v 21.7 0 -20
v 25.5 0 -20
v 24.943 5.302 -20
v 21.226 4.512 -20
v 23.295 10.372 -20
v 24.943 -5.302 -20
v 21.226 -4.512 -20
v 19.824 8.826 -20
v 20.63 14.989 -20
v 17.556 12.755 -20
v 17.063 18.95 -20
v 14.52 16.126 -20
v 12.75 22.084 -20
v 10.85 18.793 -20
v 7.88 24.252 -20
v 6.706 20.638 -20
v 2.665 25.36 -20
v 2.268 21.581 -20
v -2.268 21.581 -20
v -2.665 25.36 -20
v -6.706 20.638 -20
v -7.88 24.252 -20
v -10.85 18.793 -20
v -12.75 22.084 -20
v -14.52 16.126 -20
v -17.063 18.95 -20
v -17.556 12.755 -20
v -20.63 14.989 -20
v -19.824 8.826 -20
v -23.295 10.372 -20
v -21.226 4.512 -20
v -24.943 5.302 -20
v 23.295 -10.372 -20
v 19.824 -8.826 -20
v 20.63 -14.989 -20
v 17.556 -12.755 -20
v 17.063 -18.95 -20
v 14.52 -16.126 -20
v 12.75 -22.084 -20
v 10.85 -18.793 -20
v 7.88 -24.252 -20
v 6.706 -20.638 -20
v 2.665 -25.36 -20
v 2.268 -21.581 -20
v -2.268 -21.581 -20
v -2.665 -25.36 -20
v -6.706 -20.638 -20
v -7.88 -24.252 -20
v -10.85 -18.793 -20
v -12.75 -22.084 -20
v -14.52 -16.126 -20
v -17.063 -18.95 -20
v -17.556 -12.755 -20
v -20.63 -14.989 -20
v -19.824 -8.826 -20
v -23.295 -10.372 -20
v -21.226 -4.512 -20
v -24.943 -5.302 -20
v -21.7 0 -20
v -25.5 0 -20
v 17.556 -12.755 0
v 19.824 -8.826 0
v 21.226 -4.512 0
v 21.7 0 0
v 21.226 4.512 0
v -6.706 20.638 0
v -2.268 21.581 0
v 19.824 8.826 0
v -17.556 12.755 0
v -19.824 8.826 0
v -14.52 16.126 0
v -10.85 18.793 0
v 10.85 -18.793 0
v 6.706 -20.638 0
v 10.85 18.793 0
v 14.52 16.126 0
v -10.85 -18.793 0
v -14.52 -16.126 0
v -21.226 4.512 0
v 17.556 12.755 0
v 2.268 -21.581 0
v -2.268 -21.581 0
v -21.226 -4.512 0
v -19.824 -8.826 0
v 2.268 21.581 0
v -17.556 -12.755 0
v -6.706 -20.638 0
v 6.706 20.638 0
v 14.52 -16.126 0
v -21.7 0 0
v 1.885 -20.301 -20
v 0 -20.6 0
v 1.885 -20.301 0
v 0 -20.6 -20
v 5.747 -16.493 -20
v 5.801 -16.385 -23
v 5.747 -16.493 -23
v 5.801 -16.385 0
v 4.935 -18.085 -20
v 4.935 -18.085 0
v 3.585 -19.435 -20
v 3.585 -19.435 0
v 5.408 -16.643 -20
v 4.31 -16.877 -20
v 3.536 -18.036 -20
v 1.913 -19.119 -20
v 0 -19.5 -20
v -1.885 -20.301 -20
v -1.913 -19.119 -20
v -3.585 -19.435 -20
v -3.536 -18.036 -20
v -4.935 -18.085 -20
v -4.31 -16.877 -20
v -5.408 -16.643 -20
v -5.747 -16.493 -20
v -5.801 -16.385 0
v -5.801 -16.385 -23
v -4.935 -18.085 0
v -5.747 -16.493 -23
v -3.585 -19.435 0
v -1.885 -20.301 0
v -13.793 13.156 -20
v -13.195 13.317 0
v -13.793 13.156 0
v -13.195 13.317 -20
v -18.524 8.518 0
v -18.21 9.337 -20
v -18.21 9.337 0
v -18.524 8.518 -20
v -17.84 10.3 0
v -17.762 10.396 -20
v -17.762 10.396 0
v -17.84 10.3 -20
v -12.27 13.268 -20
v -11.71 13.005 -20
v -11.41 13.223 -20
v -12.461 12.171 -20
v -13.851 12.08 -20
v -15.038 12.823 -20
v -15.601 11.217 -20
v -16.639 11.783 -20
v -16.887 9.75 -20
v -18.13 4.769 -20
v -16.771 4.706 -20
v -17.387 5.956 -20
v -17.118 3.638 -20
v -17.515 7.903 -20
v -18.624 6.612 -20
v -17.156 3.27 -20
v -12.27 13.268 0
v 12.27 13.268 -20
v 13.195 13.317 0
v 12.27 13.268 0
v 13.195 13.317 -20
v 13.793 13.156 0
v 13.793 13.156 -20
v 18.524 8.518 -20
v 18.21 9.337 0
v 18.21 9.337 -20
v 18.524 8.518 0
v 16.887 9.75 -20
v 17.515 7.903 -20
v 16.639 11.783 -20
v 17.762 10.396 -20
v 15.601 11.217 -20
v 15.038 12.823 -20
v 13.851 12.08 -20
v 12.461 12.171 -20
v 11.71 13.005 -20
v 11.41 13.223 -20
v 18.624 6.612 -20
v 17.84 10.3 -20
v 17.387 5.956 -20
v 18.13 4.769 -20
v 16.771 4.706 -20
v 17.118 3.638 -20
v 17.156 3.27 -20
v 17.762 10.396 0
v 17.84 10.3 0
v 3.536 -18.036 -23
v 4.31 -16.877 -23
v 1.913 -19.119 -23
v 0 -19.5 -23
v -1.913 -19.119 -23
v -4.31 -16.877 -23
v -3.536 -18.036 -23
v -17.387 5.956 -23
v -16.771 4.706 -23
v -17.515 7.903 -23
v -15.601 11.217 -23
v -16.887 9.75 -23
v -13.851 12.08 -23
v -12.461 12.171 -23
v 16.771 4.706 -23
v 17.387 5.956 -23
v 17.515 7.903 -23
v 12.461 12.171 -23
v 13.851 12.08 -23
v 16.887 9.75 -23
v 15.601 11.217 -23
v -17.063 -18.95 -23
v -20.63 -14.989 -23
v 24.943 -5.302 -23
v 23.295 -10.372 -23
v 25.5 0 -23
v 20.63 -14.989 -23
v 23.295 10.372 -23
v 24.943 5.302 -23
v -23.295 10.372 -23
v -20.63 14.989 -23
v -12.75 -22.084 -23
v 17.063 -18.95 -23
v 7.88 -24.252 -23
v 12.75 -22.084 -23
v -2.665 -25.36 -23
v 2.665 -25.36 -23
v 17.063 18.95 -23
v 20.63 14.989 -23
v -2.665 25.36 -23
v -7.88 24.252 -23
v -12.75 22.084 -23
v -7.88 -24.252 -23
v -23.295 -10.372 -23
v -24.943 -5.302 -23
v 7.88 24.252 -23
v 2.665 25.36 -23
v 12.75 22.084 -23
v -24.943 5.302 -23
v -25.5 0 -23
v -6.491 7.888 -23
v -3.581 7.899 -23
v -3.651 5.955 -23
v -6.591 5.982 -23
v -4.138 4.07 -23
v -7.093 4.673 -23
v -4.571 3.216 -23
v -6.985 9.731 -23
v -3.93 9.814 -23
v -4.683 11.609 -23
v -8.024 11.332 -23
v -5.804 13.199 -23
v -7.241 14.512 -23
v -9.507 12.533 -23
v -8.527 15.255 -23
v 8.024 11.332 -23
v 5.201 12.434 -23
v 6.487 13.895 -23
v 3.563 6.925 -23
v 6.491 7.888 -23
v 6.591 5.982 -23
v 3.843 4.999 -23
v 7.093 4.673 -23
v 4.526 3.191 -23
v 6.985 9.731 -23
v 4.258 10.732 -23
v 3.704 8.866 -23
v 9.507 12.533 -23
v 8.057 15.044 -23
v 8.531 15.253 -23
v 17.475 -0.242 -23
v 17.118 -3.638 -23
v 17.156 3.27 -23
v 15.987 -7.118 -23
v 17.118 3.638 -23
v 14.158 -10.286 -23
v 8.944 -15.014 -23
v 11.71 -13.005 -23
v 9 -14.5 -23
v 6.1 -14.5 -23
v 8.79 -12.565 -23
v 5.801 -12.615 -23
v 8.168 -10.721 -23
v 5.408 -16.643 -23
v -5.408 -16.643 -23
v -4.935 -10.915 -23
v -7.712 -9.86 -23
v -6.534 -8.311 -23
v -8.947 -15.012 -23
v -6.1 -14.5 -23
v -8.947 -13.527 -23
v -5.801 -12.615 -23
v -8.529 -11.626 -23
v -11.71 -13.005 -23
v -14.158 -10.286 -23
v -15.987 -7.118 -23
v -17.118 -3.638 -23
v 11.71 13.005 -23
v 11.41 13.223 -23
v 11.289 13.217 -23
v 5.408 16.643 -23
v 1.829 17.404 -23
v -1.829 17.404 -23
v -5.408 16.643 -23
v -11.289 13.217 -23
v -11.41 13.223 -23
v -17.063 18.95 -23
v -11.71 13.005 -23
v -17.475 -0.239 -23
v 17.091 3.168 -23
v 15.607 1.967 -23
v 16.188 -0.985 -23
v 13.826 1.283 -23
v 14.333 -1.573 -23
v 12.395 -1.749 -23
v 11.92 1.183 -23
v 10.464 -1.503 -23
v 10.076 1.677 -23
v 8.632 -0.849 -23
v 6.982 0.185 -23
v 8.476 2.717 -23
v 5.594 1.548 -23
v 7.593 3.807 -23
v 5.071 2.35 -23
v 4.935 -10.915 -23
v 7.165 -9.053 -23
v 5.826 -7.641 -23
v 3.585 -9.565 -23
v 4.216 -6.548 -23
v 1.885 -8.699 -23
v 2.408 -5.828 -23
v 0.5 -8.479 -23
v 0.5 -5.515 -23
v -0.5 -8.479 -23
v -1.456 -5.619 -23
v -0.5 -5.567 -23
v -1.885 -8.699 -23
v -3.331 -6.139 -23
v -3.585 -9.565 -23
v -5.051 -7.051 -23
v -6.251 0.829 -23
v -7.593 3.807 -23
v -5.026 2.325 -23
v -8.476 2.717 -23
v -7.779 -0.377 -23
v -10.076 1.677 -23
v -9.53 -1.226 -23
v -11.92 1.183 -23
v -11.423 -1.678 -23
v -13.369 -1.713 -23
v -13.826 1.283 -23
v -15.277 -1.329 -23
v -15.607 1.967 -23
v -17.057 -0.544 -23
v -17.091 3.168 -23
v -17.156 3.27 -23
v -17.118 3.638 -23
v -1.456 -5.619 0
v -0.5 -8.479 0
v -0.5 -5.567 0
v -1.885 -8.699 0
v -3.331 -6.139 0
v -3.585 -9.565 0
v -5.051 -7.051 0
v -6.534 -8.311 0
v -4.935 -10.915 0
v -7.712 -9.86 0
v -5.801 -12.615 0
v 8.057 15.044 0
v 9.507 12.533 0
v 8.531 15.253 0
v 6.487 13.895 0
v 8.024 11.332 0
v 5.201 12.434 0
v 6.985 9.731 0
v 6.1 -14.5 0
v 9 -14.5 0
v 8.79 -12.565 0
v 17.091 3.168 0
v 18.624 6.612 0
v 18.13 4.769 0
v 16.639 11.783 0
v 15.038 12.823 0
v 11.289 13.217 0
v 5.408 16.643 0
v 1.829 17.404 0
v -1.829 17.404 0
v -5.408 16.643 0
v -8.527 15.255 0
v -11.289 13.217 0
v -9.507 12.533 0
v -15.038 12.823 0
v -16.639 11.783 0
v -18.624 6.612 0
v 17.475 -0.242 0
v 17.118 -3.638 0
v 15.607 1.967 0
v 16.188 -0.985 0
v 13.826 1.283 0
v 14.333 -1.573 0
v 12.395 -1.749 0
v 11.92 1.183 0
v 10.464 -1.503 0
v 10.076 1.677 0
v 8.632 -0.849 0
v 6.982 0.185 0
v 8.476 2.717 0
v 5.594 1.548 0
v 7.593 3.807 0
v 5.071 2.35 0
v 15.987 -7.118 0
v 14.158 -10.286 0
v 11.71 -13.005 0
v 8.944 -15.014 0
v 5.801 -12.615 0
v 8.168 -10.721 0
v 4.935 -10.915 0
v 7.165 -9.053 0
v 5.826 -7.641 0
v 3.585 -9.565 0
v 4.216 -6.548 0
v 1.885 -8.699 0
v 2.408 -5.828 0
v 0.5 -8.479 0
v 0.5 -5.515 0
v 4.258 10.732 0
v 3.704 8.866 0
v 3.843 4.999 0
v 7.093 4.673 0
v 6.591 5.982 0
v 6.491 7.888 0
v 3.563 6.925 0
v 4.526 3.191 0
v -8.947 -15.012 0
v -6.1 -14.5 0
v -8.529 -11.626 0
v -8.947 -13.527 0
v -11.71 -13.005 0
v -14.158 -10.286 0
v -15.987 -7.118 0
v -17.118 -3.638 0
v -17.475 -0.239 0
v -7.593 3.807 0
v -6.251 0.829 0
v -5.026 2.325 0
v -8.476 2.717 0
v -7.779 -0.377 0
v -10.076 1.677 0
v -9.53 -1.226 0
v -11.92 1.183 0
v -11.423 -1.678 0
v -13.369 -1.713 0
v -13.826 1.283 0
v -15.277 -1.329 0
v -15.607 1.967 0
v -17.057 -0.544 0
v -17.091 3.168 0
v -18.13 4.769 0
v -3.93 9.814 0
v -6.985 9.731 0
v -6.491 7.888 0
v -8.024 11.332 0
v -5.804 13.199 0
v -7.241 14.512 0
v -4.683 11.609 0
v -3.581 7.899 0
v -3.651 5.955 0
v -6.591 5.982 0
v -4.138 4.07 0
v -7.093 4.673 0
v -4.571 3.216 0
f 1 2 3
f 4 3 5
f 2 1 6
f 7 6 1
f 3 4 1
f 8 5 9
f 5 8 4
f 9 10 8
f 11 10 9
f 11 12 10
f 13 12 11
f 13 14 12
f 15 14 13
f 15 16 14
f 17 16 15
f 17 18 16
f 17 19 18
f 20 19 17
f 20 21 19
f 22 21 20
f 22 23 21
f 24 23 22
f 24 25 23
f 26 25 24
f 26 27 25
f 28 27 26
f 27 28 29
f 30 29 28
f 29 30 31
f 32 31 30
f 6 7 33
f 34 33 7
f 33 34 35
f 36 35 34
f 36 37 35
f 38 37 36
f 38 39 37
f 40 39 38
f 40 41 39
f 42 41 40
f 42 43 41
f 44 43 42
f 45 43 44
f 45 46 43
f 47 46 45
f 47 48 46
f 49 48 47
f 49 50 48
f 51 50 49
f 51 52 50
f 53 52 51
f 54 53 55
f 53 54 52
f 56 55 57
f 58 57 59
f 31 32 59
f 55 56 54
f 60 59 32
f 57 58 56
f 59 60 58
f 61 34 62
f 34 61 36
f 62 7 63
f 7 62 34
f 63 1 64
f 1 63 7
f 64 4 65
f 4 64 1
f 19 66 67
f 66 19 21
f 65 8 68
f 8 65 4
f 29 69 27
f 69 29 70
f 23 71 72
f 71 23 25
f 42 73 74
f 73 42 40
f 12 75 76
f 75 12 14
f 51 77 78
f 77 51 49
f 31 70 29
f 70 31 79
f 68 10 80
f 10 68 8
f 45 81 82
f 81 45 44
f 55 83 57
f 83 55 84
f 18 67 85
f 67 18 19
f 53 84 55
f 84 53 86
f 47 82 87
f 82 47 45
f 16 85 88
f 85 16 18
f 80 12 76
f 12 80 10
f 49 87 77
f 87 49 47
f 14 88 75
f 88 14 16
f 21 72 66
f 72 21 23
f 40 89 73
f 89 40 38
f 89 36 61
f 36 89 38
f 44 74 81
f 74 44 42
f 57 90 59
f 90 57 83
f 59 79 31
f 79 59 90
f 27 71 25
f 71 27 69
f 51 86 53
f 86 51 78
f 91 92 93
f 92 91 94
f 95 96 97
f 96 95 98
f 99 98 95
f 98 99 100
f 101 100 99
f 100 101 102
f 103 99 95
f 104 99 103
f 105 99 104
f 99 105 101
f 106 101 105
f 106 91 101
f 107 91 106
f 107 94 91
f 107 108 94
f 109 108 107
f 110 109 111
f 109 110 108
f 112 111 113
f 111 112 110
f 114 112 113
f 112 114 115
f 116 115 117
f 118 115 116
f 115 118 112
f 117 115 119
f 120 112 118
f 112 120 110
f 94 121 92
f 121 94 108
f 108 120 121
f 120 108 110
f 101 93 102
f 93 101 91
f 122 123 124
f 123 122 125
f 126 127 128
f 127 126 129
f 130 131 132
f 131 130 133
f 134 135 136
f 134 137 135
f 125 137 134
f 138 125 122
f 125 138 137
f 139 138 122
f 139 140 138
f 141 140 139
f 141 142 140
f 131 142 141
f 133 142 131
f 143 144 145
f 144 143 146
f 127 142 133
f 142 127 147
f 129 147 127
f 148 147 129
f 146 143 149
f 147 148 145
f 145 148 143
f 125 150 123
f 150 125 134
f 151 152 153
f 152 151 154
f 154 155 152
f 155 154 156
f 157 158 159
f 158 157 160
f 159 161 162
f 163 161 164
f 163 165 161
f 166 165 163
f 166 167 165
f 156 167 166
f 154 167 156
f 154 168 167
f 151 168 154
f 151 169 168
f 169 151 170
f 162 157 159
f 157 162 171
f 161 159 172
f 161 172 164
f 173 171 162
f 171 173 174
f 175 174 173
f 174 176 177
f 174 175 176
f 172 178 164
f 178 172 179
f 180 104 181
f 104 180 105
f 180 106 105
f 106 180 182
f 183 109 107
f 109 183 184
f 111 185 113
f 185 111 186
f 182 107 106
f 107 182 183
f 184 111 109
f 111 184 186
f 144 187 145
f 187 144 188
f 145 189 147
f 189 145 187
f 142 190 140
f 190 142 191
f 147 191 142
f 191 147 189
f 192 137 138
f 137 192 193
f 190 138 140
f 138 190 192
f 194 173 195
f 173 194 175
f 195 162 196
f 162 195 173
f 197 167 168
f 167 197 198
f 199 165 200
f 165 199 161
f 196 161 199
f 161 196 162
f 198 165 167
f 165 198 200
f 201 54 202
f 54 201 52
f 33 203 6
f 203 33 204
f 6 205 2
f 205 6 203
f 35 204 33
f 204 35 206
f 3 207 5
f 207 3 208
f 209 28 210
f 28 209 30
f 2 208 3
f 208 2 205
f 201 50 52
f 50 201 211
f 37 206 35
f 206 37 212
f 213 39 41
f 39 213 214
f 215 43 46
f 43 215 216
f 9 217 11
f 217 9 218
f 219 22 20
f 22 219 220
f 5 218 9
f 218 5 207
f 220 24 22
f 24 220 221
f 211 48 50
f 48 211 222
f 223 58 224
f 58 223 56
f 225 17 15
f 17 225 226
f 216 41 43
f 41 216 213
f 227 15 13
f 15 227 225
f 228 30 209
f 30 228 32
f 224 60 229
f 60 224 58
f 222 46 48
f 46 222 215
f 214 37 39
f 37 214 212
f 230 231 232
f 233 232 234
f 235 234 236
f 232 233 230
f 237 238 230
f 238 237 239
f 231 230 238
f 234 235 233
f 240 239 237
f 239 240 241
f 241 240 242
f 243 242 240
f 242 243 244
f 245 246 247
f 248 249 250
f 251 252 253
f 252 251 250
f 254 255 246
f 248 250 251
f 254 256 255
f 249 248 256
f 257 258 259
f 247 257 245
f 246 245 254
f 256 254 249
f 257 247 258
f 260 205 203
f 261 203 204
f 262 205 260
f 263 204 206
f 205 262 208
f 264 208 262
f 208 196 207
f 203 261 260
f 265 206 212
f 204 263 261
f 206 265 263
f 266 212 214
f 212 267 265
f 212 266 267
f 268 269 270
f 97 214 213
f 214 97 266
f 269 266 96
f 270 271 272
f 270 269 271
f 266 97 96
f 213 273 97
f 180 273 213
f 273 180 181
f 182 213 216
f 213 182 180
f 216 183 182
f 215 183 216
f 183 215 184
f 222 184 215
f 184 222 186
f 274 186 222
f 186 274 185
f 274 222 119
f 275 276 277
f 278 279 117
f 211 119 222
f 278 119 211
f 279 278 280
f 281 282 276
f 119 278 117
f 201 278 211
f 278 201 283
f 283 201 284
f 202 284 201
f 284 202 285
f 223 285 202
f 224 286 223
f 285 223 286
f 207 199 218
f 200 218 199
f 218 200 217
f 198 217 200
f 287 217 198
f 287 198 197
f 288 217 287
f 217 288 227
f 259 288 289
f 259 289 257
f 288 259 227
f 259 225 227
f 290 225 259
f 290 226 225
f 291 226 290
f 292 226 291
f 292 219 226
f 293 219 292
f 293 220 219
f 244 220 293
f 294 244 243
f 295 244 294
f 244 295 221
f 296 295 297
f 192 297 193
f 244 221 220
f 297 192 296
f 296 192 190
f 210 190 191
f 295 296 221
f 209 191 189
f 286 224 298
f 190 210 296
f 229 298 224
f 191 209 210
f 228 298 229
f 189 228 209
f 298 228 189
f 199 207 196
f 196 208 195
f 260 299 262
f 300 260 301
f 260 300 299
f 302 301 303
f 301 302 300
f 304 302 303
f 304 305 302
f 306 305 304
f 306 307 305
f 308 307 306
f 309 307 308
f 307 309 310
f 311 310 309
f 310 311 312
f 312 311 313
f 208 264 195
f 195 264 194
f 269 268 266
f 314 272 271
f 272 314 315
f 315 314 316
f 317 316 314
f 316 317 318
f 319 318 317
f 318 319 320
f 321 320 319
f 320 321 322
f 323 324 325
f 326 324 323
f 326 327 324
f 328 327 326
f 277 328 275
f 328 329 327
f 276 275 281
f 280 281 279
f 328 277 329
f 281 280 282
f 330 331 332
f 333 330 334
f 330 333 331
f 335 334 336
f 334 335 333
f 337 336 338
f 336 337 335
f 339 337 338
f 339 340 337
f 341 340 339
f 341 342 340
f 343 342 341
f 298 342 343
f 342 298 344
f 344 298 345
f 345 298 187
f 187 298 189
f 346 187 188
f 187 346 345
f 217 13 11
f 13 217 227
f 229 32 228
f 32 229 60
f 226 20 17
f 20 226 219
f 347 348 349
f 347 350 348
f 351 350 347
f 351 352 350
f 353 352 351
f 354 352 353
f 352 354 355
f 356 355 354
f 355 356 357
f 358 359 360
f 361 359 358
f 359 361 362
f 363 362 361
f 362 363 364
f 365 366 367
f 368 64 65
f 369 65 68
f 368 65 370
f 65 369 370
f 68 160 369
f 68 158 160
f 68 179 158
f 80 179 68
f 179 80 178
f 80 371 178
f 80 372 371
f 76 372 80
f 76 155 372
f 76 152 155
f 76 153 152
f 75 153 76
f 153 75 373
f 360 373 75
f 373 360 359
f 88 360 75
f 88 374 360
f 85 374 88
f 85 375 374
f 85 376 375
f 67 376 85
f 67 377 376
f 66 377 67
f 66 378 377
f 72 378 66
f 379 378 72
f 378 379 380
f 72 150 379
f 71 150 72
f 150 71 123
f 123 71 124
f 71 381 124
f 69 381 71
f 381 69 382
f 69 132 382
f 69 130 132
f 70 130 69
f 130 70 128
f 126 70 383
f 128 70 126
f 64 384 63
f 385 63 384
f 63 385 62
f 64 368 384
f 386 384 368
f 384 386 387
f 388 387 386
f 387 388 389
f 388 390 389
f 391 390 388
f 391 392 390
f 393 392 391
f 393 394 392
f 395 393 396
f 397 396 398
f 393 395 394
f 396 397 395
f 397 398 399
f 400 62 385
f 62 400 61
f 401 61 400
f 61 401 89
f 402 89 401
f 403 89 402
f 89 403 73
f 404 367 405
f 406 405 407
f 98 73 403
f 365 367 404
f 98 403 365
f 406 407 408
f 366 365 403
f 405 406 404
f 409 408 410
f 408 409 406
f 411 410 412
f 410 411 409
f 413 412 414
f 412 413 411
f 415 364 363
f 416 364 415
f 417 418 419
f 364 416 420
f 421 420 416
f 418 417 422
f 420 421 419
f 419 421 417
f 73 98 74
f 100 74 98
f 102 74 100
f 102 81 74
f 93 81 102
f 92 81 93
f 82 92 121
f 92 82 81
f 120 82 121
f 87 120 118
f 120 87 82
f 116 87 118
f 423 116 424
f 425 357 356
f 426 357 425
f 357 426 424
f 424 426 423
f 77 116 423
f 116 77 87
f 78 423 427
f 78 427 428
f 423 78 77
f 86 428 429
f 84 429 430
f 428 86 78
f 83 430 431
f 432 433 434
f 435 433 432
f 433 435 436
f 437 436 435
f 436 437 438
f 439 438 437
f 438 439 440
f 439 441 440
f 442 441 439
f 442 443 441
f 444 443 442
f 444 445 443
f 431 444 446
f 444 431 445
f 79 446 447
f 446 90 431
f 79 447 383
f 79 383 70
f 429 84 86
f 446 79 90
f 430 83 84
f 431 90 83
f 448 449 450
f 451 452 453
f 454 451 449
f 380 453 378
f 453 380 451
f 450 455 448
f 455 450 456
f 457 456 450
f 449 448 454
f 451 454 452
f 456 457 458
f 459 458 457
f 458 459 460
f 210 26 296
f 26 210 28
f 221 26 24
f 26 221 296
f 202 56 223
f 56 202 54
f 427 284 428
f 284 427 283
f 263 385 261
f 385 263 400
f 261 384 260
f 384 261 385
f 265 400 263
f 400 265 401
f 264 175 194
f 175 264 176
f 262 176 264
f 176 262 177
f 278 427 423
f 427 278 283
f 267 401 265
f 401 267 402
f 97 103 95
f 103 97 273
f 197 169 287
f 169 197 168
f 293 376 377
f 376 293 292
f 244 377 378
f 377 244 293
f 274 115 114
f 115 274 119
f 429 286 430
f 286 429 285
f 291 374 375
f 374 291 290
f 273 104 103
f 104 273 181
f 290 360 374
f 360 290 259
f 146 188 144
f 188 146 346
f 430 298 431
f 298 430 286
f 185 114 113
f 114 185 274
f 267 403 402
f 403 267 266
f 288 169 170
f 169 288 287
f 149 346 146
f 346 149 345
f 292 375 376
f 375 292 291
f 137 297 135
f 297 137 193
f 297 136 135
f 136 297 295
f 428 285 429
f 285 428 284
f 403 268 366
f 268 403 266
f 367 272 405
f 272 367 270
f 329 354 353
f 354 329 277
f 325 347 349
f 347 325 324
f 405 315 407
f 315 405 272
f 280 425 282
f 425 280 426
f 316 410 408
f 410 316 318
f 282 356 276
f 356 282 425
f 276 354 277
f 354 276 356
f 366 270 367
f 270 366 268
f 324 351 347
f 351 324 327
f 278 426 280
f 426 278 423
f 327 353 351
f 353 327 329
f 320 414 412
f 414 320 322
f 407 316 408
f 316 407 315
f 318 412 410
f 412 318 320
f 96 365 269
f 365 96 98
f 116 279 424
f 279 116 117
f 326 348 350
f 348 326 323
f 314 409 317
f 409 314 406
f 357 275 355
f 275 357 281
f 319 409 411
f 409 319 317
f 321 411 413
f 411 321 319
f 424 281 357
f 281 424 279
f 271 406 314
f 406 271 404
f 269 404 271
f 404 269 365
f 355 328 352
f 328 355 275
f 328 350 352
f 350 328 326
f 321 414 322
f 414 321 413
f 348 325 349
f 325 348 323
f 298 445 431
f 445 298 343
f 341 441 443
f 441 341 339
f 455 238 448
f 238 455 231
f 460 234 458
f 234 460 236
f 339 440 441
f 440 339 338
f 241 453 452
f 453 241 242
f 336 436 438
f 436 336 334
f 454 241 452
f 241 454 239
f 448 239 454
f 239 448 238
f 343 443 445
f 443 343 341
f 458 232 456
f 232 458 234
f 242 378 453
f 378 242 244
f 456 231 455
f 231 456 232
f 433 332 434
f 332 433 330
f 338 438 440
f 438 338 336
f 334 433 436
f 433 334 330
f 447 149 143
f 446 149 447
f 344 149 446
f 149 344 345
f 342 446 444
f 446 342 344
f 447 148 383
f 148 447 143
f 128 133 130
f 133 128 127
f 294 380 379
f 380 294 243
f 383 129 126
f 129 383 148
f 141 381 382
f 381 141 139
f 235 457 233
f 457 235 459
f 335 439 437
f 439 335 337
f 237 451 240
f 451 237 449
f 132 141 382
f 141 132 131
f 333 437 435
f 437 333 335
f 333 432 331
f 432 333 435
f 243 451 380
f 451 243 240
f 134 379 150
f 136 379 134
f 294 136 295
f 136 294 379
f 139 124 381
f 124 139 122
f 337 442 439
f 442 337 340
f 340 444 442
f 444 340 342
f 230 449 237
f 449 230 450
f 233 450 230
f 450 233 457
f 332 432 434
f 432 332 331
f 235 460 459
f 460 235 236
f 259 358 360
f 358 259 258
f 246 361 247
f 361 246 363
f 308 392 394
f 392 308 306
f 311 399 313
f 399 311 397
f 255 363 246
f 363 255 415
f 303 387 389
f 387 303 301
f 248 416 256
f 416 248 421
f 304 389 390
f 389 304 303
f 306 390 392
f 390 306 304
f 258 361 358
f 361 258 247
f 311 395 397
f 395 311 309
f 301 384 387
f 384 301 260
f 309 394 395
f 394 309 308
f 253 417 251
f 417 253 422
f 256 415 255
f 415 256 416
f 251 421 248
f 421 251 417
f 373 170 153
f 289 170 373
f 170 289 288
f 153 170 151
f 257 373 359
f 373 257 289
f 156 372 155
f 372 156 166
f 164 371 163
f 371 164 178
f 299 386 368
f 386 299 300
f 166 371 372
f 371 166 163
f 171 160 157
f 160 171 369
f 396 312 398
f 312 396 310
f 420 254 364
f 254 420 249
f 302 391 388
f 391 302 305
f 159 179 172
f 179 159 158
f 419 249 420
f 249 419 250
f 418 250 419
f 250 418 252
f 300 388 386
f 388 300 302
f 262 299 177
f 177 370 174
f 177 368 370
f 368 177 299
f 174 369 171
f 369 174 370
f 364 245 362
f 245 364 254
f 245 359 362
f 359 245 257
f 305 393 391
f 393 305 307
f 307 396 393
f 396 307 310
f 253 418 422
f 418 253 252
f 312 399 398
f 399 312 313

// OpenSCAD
// file: Hexa.scad
// include <Hexa.scad>;

m3h = 2.4; 		// hauteur
m3k = 5.5; 		// plat a plat
m3e = 6.3; 		// pointe a pointe
m3r = m3e/2; 	// rayon pointe a pointe
m3p = 0.5; 		// pas

m4h = 3.2;
m4k = 7;
m4e = 8.08;
m4r = m4e/2;
m4p = 0.7;

m5h = 4.7;
m5k = 8;
m5e = 9.23;
m5r = m5e/2;
m5p = 0.8;

m6h = 5.2;
m6k = 10;
m6e = 11.54;
m6r = m6e/2;
m6p = 1.0;

m8h = 6.8;
m8k = 13;
m8e = 15.01;
m8r = m8e/2;
m8p = 1.25;

m10h = 8.4;
m10k = 17;
m10e = 19.62;
m10r = m10e/2;
m10p = 1.5;

m12h = 10.8;
m12k = 19;
m12e = 21.93;
m12r = m12e/2;
m12p = 1.75;

coef = 2/sqrt(3);
echo(coef);

module m3(jk=0, jh=0, jvis=0){
    d = m3k * coef;
    cylinder(r=d/2+jk, h=m3h+jh, $fn=6);
    if(jvis != 0){
        translate([0,0,-30]) cylinder(r=3/2+jvis, h=60, $fn=12);
    }
}
// main file
rsty = 6; // rayon stylo
rbig = 43/2;  // rayon cylindre de serrage 

rv = 2.5 + 0.1; // rayon vis
rc = 3; // rayon colonnes
rr = 6; // rayon roulement bille 
rrz = 19; // roulement long


supx = 80;
supz = 20;

epr = 4;
eprr = 3; // épaisseur roulement
epz = 3;

include <Hexa.scad>;
//use<Hexa.scad>;


module rouloum(){
	difference(){
		union(){
			cylinder(r=rbig+epr, h=supz+epz);
			
		}
		// ext
		tub();
		// centre
		translate([0,0,-1]) cylinder(r=rbig-epr, h=supz+epz+2);
		//
		for(g=[0:3]){
			rotate([0,0,120*g]) translate([0,rbig-rr-1, 0])  
			translate([0,0,-1])  cylinder(r=rr+0.1, h=supz+1);
		}
		for(g=[0:3]){
			rotate([0,0,120*g]) translate([0,rbig-rr-1, 0]) difference(){
				translate([0,0,-1])  cylinder(r=rc+2, h=supz+epz+2);
			}
		}
		
	}
	difference(){
		union(){
			for(g=[0:3]){
						rotate([0,0,120*g]) translate([0,rbig-rr-1, 0]) difference(){
							cylinder(r=rr+eprr, h=supz+epz);
							translate([0,0,-1])  cylinder(r=rr+0.1, h=supz+epz+2);
							translate([-0.5,-rr-eprr-1,-1])  cube([1, eprr+2, supz+epz+2]);
						}
			}
		}
		tub();
	}
}

module tub(){
	j = 0.2;
	difference(){
		translate([0,0,-1]) cylinder(r=rbig+epr+1, h=supz+1);
		translate([0,0,-1]) cylinder(r=rbig+j, h=supz+2);
	}
}

module colo(){
	epcolz = 10;
	eprcol = 3.7;
	j = 0.2; // léger jeux resserrage colonnes;
	//
	for(g=[0:3]){
		rotate([0,0,120*g]) translate([0,rbig-rr-1-j, 0]) difference(){
			union(){
				translate([0,0,0])  #cylinder(r=rc+eprcol, h=epcolz);
				// plot
				rotate([0,0,-7])
					translate([rc,-eprcol,0]) cube([eprcol+2, eprcol*2, epcolz]);
			}
			rotate([0,0,-7]){
				translate([0,0,-1])  cylinder(r=rc+0.2, h=epcolz+2);
				// fente
				translate([2, -1, -1]) cube([eprcol*2, 2, epcolz+2]);
				// vis serrages
				translate([rc+2.5, eprcol*2, epcolz/2]) rotate([90,0,0]) cylinder(r=1.6, h=eprcol*4, $fn=9);
				translate([rc+2.5, eprcol, epcolz/2]) rotate([-90,0,0]) cylinder(r=m3r+0.4, h=m3h+0.6, $fn=6);
				translate([rc+2.5, -eprcol, epcolz/2]) rotate([90,0,0]) cylinder(r=m3r+0.4, h=m3h+0.6, $fn=6);
			}
				
		}
	}
	//
	difference(){
		cylinder(r=rsty+eprcol, h=epcolz);
		translate([0,0,-1]) cylinder(r=rsty, h=epcolz+2);
		//
		for(g=[0:3]){
			rotate([0,0,120*g]) translate([0,rbig-rr-1, 0]){
				rotate([0,0,-7]){
					translate([rc+2.5, eprcol*2, epcolz/2]) rotate([90,0,0]) cylinder(r=1.6, h=eprcol*4+2, $fn=9);
					//translate([rc+2.5, eprcol, epcolz/2]) rotate([-90,0,0]) cylinder(r=3.5, h=eprcol);
					translate([rc+2.5, -eprcol, epcolz/2]) rotate([90,0,0]) cylinder(r=m3r+0.4, h=m3h+0.6, $fn=6);
					translate([rc+2.5+2.5, -eprcol, epcolz/2]) rotate([90,0,0]) cylinder(r=m3r+0.4, h=m3h+0.6, $fn=6);
				}
			}
		}
		for(g=[0:3]){
			rotate([0,0,120*g -10]) translate([0,0,epcolz/2]) rotate([90,0,0]) cylinder(r=1.5, h=rsty+eprcol+1, $fn=9);
		}
	}
}

rotate([180,0,0]) rouloum();

//colo();
//translate([0,0,11]) rouloum();

//colo();
//translate([0,40,0]) colo();
